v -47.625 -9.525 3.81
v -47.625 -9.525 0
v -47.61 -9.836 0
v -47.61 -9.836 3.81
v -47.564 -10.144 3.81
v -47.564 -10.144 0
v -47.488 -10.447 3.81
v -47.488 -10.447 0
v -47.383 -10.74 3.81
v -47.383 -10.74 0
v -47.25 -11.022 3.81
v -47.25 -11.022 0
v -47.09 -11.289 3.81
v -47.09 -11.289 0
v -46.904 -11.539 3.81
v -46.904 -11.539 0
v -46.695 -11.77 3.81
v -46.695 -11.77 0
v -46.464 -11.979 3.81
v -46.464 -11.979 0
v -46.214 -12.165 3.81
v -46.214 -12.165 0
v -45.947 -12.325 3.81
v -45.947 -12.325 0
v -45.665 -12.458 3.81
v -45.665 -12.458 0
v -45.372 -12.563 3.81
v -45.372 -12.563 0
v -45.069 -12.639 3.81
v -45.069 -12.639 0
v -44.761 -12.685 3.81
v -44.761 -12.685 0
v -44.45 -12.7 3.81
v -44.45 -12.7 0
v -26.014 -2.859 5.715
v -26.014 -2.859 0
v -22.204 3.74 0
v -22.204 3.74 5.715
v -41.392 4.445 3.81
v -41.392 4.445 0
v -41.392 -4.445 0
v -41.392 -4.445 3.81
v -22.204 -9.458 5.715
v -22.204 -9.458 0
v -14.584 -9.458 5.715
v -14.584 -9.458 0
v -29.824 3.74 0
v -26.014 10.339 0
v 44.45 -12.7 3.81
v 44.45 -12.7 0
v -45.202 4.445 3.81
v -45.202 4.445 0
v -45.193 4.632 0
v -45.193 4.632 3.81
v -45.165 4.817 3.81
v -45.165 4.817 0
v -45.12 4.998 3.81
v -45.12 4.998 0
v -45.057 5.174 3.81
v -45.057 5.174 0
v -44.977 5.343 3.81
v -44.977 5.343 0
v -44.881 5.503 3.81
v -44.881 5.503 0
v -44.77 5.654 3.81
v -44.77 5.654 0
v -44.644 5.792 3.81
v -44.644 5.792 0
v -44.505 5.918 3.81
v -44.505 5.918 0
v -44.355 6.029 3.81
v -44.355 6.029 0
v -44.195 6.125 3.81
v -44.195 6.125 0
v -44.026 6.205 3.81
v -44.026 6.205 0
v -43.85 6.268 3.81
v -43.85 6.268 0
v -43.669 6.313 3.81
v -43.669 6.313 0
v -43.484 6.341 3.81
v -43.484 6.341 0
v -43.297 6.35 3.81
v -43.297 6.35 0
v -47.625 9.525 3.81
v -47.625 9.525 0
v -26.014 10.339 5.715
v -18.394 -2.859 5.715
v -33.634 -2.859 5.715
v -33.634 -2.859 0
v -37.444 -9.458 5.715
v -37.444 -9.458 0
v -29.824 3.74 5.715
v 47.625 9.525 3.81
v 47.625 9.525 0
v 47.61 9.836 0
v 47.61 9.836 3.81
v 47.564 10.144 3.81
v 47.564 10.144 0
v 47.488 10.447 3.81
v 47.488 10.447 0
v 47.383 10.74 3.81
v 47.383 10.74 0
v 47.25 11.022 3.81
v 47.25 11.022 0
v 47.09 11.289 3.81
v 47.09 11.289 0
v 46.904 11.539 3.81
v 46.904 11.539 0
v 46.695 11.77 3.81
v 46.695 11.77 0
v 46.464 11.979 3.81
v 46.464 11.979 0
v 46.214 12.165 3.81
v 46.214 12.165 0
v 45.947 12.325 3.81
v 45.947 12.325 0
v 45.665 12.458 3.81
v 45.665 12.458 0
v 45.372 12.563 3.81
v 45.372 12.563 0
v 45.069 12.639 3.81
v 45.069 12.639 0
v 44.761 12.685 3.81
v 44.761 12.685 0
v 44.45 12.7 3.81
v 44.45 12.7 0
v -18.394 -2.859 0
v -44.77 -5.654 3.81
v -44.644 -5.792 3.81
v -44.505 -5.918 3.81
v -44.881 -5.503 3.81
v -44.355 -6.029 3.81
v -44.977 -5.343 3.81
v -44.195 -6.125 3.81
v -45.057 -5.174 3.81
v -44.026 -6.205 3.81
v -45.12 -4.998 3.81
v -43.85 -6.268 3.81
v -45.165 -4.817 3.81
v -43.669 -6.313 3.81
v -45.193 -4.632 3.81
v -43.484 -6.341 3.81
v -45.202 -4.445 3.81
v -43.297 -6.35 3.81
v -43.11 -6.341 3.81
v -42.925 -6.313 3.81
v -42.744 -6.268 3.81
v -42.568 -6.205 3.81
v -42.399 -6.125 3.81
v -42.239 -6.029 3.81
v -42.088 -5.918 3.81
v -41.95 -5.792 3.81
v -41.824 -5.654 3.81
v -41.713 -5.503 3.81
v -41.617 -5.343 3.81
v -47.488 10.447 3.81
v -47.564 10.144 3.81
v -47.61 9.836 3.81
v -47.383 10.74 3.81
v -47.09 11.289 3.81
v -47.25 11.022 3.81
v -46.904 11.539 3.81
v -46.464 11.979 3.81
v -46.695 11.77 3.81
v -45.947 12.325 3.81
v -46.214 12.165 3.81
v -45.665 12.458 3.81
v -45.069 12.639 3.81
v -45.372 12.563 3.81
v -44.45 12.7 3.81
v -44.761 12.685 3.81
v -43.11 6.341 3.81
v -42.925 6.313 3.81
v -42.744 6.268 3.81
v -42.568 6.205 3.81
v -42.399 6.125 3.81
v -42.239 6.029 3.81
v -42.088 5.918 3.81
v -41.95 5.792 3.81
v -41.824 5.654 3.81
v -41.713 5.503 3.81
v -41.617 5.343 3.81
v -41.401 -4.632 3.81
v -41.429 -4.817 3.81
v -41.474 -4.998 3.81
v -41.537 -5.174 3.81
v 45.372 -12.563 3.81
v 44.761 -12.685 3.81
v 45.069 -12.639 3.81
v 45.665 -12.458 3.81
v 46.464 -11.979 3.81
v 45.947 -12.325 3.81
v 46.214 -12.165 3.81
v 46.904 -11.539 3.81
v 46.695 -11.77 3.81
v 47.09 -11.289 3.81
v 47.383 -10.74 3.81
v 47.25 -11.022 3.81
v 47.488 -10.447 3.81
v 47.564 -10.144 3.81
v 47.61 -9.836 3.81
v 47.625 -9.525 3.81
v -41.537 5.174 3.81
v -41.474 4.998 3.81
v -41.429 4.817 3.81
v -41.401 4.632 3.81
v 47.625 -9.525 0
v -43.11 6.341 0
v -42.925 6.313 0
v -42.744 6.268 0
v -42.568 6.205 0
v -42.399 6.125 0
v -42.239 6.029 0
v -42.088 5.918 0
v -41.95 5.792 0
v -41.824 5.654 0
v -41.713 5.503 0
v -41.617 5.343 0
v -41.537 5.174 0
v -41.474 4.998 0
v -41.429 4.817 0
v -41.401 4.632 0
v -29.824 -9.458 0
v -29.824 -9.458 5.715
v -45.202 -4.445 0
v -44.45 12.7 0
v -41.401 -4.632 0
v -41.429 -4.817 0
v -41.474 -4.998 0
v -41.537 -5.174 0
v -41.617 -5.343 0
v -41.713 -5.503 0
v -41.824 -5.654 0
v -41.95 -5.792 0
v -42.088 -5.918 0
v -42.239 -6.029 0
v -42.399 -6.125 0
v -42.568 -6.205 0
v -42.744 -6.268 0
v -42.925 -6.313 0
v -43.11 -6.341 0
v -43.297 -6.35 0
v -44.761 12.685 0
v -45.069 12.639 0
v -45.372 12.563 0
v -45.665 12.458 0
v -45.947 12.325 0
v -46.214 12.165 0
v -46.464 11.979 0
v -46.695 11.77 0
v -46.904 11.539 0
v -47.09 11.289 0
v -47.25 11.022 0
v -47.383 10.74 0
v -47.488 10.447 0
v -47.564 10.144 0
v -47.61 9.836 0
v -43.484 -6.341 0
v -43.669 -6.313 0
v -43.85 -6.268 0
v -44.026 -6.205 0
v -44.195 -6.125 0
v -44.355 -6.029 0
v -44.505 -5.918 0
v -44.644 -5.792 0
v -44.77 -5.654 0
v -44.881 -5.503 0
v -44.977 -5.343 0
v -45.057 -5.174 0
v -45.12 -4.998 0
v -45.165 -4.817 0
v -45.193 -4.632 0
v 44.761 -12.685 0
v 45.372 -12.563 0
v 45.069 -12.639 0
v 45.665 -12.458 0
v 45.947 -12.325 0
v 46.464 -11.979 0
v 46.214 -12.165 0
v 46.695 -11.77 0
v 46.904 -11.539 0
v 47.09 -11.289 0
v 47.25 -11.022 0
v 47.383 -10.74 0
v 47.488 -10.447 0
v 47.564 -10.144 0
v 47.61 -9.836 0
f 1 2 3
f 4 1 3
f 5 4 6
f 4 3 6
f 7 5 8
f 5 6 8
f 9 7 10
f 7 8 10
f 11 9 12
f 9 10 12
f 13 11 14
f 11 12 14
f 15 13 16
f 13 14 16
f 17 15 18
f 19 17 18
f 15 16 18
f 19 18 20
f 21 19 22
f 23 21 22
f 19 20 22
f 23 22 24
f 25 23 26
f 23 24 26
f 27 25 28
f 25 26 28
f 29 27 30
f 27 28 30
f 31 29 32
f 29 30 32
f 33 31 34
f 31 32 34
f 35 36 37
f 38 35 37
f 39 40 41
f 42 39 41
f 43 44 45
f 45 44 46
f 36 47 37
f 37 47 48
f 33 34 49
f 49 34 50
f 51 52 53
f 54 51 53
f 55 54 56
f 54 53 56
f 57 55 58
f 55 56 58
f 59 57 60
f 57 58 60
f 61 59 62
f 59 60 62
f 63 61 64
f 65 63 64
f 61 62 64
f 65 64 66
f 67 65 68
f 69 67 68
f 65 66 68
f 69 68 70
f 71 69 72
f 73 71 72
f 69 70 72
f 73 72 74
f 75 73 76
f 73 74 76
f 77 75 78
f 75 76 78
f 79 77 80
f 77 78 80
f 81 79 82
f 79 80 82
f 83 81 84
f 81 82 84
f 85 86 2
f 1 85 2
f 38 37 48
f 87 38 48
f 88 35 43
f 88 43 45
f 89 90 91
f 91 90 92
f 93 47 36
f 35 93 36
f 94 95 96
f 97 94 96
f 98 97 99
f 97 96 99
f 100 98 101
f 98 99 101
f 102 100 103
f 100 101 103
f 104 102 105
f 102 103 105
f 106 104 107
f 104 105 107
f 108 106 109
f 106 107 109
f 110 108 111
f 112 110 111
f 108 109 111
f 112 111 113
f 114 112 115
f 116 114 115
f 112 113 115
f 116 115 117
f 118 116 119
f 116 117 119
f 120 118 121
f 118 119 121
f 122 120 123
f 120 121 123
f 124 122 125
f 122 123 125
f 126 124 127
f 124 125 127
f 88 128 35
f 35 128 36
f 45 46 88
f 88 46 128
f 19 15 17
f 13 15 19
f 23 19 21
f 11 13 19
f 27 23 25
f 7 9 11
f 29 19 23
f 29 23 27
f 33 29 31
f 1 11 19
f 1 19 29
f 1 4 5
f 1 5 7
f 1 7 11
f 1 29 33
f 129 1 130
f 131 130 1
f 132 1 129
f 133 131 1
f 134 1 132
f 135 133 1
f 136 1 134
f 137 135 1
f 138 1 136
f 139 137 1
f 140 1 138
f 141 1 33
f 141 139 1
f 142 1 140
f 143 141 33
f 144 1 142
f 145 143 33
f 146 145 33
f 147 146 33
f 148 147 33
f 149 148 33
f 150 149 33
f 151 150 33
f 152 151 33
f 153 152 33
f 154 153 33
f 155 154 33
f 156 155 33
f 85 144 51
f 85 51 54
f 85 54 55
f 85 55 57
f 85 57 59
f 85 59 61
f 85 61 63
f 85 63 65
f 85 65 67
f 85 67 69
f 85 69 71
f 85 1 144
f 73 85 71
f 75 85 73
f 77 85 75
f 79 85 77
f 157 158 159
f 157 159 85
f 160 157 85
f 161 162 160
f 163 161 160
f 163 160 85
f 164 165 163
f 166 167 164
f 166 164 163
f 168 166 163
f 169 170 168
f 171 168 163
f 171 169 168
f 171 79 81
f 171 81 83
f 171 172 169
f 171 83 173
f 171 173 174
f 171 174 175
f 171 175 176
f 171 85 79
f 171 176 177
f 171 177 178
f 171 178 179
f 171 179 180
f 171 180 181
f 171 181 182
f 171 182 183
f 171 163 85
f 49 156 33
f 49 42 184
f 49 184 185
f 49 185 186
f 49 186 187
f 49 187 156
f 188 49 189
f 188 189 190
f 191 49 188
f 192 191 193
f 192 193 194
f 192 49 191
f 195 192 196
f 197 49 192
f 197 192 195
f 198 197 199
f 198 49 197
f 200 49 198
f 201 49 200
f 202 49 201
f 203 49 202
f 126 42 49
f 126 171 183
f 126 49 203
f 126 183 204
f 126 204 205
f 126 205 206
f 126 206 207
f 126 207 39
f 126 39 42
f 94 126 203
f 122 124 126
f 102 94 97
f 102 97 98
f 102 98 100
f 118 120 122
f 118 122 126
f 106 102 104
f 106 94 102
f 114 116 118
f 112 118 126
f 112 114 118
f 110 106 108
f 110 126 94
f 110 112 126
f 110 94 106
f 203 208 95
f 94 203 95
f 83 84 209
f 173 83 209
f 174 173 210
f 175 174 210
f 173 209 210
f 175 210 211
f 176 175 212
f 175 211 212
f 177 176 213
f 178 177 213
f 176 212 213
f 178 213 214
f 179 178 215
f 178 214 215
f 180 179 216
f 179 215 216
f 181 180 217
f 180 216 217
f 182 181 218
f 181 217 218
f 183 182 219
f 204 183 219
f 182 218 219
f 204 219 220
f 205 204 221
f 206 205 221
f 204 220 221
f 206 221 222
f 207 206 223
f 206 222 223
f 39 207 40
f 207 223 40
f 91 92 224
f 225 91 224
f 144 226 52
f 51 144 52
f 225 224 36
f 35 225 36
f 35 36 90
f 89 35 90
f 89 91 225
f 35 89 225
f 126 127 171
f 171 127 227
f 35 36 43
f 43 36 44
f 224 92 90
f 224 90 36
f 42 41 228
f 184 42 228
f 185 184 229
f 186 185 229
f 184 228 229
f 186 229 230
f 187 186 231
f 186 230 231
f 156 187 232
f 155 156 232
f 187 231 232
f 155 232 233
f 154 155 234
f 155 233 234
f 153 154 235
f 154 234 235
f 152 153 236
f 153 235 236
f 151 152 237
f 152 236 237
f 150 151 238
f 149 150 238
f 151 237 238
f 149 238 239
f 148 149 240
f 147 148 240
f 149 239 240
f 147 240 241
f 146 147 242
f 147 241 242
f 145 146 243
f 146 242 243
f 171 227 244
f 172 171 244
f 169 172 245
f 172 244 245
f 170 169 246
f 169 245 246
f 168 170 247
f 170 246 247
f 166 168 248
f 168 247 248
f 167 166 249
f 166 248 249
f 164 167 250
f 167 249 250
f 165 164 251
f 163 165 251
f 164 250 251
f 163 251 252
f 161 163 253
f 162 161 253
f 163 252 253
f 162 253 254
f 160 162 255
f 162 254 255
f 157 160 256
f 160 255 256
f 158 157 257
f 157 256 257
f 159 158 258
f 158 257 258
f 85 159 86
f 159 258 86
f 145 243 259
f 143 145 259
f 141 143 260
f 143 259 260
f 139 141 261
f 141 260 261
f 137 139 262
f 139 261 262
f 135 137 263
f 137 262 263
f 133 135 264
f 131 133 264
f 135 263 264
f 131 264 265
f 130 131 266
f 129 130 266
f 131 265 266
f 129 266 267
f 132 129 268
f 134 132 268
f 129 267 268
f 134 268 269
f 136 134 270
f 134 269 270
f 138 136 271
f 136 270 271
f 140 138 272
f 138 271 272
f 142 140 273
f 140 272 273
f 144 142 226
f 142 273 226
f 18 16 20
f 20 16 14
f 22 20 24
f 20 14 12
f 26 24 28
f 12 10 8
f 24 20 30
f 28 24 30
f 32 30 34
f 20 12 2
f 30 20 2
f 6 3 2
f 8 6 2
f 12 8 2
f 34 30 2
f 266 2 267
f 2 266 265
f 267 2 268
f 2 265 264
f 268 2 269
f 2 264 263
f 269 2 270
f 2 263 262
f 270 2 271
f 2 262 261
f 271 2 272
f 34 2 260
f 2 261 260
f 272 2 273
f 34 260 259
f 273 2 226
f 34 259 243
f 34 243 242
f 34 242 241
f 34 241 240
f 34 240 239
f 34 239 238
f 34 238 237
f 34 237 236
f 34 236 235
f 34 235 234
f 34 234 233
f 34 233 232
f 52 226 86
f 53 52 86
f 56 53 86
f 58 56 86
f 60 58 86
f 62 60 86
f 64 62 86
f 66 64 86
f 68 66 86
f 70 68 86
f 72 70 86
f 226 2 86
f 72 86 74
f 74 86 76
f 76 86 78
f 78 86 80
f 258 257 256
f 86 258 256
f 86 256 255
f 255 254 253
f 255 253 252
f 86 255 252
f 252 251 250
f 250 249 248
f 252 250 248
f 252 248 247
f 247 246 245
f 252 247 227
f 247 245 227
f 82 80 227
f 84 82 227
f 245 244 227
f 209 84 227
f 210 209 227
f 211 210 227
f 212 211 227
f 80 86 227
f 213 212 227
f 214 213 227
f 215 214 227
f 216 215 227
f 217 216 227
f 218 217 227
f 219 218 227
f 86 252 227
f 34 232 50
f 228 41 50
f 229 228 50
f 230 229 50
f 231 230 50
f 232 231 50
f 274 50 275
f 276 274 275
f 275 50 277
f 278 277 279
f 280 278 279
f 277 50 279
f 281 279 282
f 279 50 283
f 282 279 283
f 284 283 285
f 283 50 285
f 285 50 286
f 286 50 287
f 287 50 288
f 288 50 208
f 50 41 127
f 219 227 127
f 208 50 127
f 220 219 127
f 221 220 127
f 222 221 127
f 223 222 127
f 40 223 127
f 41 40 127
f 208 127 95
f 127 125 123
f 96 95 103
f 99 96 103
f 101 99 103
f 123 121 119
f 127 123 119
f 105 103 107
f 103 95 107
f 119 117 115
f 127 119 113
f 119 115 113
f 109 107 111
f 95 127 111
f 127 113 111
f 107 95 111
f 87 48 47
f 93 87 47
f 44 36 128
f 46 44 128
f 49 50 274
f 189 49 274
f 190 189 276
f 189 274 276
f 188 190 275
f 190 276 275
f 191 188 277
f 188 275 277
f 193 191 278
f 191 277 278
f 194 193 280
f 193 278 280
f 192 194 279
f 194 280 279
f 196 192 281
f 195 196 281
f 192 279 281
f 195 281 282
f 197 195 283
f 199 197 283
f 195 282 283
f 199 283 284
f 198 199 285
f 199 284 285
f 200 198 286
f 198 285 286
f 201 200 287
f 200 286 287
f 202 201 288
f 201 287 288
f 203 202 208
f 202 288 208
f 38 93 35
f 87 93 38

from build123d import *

# Parameters (mm, degrees)
F2_DEPTH = 3.81
F3_DEPTH = 5.715


with BuildPart() as f2:
    # F0 (on Top) → F2 (new body)
    with BuildSketch(Plane.XY):
        with BuildLine():
            Line((-44.45, -12.7), (44.45, -12.7))
            ThreePointArc((44.45, -12.7), (46.695064, -11.770064), (47.625, -9.525))
            Line((47.625, -9.525), (47.625, 9.525))
            ThreePointArc((47.625, 9.525), (46.695064, 11.770064), (44.45, 12.7))
            Line((44.45, 12.7), (-44.45, 12.7))
            ThreePointArc((-44.45, 12.7), (-46.695064, 11.770064), (-47.625, 9.525))
            Line((-47.625, 9.525), (-47.625, -9.525))
            ThreePointArc((-47.625, -9.525), (-46.695064, -11.770064), (-44.45, -12.7))
        make_face()
        with BuildLine():
            ThreePointArc((45.72, -8.89), (45.162038, -10.237038), (43.815, -10.795))
            Line((43.815, -10.795), (-43.815, -10.795))
            ThreePointArc((-43.815, -10.795), (-45.162038, -10.237038), (-45.72, -8.89))
            Line((-45.72, -8.89), (-45.72, 8.89))
            ThreePointArc((-45.72, 8.89), (-45.162038, 10.237038), (-43.815, 10.795))
            Line((-43.815, 10.795), (43.815, 10.795))
            ThreePointArc((43.815, 10.795), (45.162038, 10.237038), (45.72, 8.89))
            Line((45.72, 8.89), (45.72, -8.89))
        make_face(mode=Mode.SUBTRACT)
        with BuildLine():
            Line((-43.815, -10.795), (43.815, -10.795))
            ThreePointArc((43.815, -10.795), (45.162038, -10.237038), (45.72, -8.89))
            Line((45.72, -8.89), (45.72, 8.89))
            ThreePointArc((45.72, 8.89), (45.162038, 10.237038), (43.815, 10.795))
            Line((43.815, 10.795), (-43.815, 10.795))
            ThreePointArc((-43.815, 10.795), (-45.162038, 10.237038), (-45.72, 8.89))
            Line((-45.72, 8.89), (-45.72, -8.89))
            ThreePointArc((-45.72, -8.89), (-45.162038, -10.237038), (-43.815, -10.795))
        make_face()
        with BuildLine():
            Line((-41.391969, 4.445), (-41.391969, -4.445))
            ThreePointArc((-41.391969, -4.445), (-41.94993, -5.792038), (-43.296969, -6.35))
            ThreePointArc((-43.296969, -6.35), (-44.644007, -5.792038), (-45.201969, -4.445))
            Line((-45.201969, -4.445), (-45.201969, 4.445))
            ThreePointArc((-45.201969, 4.445), (-44.644007, 5.792038), (-43.296969, 6.35))
            ThreePointArc((-43.296969, 6.35), (-41.94993, 5.792038), (-41.391969, 4.445))
        make_face(mode=Mode.SUBTRACT)
    extrude(amount=F2_DEPTH)


with BuildPart() as f3:
    # F1 (on Top) → F3 (new body)
    with BuildSketch(Plane.XY):
        Polygon((-29.824159, 3.740004), (-26.014159, -2.85911), (-22.204159, 3.740004), (-26.014159, 10.339118), align=None)
        Polygon((-29.824159, -9.458223), (-26.014159, -2.85911), (-33.634159, -2.85911), (-37.444159, -9.458223), align=None)
        Polygon((-18.394159, -2.85911), (-26.014159, -2.85911), (-22.204159, -9.458223), (-14.584159, -9.458223), align=None)
    extrude(amount=F3_DEPTH)


solid = Compound([f2.part, f3.part])
